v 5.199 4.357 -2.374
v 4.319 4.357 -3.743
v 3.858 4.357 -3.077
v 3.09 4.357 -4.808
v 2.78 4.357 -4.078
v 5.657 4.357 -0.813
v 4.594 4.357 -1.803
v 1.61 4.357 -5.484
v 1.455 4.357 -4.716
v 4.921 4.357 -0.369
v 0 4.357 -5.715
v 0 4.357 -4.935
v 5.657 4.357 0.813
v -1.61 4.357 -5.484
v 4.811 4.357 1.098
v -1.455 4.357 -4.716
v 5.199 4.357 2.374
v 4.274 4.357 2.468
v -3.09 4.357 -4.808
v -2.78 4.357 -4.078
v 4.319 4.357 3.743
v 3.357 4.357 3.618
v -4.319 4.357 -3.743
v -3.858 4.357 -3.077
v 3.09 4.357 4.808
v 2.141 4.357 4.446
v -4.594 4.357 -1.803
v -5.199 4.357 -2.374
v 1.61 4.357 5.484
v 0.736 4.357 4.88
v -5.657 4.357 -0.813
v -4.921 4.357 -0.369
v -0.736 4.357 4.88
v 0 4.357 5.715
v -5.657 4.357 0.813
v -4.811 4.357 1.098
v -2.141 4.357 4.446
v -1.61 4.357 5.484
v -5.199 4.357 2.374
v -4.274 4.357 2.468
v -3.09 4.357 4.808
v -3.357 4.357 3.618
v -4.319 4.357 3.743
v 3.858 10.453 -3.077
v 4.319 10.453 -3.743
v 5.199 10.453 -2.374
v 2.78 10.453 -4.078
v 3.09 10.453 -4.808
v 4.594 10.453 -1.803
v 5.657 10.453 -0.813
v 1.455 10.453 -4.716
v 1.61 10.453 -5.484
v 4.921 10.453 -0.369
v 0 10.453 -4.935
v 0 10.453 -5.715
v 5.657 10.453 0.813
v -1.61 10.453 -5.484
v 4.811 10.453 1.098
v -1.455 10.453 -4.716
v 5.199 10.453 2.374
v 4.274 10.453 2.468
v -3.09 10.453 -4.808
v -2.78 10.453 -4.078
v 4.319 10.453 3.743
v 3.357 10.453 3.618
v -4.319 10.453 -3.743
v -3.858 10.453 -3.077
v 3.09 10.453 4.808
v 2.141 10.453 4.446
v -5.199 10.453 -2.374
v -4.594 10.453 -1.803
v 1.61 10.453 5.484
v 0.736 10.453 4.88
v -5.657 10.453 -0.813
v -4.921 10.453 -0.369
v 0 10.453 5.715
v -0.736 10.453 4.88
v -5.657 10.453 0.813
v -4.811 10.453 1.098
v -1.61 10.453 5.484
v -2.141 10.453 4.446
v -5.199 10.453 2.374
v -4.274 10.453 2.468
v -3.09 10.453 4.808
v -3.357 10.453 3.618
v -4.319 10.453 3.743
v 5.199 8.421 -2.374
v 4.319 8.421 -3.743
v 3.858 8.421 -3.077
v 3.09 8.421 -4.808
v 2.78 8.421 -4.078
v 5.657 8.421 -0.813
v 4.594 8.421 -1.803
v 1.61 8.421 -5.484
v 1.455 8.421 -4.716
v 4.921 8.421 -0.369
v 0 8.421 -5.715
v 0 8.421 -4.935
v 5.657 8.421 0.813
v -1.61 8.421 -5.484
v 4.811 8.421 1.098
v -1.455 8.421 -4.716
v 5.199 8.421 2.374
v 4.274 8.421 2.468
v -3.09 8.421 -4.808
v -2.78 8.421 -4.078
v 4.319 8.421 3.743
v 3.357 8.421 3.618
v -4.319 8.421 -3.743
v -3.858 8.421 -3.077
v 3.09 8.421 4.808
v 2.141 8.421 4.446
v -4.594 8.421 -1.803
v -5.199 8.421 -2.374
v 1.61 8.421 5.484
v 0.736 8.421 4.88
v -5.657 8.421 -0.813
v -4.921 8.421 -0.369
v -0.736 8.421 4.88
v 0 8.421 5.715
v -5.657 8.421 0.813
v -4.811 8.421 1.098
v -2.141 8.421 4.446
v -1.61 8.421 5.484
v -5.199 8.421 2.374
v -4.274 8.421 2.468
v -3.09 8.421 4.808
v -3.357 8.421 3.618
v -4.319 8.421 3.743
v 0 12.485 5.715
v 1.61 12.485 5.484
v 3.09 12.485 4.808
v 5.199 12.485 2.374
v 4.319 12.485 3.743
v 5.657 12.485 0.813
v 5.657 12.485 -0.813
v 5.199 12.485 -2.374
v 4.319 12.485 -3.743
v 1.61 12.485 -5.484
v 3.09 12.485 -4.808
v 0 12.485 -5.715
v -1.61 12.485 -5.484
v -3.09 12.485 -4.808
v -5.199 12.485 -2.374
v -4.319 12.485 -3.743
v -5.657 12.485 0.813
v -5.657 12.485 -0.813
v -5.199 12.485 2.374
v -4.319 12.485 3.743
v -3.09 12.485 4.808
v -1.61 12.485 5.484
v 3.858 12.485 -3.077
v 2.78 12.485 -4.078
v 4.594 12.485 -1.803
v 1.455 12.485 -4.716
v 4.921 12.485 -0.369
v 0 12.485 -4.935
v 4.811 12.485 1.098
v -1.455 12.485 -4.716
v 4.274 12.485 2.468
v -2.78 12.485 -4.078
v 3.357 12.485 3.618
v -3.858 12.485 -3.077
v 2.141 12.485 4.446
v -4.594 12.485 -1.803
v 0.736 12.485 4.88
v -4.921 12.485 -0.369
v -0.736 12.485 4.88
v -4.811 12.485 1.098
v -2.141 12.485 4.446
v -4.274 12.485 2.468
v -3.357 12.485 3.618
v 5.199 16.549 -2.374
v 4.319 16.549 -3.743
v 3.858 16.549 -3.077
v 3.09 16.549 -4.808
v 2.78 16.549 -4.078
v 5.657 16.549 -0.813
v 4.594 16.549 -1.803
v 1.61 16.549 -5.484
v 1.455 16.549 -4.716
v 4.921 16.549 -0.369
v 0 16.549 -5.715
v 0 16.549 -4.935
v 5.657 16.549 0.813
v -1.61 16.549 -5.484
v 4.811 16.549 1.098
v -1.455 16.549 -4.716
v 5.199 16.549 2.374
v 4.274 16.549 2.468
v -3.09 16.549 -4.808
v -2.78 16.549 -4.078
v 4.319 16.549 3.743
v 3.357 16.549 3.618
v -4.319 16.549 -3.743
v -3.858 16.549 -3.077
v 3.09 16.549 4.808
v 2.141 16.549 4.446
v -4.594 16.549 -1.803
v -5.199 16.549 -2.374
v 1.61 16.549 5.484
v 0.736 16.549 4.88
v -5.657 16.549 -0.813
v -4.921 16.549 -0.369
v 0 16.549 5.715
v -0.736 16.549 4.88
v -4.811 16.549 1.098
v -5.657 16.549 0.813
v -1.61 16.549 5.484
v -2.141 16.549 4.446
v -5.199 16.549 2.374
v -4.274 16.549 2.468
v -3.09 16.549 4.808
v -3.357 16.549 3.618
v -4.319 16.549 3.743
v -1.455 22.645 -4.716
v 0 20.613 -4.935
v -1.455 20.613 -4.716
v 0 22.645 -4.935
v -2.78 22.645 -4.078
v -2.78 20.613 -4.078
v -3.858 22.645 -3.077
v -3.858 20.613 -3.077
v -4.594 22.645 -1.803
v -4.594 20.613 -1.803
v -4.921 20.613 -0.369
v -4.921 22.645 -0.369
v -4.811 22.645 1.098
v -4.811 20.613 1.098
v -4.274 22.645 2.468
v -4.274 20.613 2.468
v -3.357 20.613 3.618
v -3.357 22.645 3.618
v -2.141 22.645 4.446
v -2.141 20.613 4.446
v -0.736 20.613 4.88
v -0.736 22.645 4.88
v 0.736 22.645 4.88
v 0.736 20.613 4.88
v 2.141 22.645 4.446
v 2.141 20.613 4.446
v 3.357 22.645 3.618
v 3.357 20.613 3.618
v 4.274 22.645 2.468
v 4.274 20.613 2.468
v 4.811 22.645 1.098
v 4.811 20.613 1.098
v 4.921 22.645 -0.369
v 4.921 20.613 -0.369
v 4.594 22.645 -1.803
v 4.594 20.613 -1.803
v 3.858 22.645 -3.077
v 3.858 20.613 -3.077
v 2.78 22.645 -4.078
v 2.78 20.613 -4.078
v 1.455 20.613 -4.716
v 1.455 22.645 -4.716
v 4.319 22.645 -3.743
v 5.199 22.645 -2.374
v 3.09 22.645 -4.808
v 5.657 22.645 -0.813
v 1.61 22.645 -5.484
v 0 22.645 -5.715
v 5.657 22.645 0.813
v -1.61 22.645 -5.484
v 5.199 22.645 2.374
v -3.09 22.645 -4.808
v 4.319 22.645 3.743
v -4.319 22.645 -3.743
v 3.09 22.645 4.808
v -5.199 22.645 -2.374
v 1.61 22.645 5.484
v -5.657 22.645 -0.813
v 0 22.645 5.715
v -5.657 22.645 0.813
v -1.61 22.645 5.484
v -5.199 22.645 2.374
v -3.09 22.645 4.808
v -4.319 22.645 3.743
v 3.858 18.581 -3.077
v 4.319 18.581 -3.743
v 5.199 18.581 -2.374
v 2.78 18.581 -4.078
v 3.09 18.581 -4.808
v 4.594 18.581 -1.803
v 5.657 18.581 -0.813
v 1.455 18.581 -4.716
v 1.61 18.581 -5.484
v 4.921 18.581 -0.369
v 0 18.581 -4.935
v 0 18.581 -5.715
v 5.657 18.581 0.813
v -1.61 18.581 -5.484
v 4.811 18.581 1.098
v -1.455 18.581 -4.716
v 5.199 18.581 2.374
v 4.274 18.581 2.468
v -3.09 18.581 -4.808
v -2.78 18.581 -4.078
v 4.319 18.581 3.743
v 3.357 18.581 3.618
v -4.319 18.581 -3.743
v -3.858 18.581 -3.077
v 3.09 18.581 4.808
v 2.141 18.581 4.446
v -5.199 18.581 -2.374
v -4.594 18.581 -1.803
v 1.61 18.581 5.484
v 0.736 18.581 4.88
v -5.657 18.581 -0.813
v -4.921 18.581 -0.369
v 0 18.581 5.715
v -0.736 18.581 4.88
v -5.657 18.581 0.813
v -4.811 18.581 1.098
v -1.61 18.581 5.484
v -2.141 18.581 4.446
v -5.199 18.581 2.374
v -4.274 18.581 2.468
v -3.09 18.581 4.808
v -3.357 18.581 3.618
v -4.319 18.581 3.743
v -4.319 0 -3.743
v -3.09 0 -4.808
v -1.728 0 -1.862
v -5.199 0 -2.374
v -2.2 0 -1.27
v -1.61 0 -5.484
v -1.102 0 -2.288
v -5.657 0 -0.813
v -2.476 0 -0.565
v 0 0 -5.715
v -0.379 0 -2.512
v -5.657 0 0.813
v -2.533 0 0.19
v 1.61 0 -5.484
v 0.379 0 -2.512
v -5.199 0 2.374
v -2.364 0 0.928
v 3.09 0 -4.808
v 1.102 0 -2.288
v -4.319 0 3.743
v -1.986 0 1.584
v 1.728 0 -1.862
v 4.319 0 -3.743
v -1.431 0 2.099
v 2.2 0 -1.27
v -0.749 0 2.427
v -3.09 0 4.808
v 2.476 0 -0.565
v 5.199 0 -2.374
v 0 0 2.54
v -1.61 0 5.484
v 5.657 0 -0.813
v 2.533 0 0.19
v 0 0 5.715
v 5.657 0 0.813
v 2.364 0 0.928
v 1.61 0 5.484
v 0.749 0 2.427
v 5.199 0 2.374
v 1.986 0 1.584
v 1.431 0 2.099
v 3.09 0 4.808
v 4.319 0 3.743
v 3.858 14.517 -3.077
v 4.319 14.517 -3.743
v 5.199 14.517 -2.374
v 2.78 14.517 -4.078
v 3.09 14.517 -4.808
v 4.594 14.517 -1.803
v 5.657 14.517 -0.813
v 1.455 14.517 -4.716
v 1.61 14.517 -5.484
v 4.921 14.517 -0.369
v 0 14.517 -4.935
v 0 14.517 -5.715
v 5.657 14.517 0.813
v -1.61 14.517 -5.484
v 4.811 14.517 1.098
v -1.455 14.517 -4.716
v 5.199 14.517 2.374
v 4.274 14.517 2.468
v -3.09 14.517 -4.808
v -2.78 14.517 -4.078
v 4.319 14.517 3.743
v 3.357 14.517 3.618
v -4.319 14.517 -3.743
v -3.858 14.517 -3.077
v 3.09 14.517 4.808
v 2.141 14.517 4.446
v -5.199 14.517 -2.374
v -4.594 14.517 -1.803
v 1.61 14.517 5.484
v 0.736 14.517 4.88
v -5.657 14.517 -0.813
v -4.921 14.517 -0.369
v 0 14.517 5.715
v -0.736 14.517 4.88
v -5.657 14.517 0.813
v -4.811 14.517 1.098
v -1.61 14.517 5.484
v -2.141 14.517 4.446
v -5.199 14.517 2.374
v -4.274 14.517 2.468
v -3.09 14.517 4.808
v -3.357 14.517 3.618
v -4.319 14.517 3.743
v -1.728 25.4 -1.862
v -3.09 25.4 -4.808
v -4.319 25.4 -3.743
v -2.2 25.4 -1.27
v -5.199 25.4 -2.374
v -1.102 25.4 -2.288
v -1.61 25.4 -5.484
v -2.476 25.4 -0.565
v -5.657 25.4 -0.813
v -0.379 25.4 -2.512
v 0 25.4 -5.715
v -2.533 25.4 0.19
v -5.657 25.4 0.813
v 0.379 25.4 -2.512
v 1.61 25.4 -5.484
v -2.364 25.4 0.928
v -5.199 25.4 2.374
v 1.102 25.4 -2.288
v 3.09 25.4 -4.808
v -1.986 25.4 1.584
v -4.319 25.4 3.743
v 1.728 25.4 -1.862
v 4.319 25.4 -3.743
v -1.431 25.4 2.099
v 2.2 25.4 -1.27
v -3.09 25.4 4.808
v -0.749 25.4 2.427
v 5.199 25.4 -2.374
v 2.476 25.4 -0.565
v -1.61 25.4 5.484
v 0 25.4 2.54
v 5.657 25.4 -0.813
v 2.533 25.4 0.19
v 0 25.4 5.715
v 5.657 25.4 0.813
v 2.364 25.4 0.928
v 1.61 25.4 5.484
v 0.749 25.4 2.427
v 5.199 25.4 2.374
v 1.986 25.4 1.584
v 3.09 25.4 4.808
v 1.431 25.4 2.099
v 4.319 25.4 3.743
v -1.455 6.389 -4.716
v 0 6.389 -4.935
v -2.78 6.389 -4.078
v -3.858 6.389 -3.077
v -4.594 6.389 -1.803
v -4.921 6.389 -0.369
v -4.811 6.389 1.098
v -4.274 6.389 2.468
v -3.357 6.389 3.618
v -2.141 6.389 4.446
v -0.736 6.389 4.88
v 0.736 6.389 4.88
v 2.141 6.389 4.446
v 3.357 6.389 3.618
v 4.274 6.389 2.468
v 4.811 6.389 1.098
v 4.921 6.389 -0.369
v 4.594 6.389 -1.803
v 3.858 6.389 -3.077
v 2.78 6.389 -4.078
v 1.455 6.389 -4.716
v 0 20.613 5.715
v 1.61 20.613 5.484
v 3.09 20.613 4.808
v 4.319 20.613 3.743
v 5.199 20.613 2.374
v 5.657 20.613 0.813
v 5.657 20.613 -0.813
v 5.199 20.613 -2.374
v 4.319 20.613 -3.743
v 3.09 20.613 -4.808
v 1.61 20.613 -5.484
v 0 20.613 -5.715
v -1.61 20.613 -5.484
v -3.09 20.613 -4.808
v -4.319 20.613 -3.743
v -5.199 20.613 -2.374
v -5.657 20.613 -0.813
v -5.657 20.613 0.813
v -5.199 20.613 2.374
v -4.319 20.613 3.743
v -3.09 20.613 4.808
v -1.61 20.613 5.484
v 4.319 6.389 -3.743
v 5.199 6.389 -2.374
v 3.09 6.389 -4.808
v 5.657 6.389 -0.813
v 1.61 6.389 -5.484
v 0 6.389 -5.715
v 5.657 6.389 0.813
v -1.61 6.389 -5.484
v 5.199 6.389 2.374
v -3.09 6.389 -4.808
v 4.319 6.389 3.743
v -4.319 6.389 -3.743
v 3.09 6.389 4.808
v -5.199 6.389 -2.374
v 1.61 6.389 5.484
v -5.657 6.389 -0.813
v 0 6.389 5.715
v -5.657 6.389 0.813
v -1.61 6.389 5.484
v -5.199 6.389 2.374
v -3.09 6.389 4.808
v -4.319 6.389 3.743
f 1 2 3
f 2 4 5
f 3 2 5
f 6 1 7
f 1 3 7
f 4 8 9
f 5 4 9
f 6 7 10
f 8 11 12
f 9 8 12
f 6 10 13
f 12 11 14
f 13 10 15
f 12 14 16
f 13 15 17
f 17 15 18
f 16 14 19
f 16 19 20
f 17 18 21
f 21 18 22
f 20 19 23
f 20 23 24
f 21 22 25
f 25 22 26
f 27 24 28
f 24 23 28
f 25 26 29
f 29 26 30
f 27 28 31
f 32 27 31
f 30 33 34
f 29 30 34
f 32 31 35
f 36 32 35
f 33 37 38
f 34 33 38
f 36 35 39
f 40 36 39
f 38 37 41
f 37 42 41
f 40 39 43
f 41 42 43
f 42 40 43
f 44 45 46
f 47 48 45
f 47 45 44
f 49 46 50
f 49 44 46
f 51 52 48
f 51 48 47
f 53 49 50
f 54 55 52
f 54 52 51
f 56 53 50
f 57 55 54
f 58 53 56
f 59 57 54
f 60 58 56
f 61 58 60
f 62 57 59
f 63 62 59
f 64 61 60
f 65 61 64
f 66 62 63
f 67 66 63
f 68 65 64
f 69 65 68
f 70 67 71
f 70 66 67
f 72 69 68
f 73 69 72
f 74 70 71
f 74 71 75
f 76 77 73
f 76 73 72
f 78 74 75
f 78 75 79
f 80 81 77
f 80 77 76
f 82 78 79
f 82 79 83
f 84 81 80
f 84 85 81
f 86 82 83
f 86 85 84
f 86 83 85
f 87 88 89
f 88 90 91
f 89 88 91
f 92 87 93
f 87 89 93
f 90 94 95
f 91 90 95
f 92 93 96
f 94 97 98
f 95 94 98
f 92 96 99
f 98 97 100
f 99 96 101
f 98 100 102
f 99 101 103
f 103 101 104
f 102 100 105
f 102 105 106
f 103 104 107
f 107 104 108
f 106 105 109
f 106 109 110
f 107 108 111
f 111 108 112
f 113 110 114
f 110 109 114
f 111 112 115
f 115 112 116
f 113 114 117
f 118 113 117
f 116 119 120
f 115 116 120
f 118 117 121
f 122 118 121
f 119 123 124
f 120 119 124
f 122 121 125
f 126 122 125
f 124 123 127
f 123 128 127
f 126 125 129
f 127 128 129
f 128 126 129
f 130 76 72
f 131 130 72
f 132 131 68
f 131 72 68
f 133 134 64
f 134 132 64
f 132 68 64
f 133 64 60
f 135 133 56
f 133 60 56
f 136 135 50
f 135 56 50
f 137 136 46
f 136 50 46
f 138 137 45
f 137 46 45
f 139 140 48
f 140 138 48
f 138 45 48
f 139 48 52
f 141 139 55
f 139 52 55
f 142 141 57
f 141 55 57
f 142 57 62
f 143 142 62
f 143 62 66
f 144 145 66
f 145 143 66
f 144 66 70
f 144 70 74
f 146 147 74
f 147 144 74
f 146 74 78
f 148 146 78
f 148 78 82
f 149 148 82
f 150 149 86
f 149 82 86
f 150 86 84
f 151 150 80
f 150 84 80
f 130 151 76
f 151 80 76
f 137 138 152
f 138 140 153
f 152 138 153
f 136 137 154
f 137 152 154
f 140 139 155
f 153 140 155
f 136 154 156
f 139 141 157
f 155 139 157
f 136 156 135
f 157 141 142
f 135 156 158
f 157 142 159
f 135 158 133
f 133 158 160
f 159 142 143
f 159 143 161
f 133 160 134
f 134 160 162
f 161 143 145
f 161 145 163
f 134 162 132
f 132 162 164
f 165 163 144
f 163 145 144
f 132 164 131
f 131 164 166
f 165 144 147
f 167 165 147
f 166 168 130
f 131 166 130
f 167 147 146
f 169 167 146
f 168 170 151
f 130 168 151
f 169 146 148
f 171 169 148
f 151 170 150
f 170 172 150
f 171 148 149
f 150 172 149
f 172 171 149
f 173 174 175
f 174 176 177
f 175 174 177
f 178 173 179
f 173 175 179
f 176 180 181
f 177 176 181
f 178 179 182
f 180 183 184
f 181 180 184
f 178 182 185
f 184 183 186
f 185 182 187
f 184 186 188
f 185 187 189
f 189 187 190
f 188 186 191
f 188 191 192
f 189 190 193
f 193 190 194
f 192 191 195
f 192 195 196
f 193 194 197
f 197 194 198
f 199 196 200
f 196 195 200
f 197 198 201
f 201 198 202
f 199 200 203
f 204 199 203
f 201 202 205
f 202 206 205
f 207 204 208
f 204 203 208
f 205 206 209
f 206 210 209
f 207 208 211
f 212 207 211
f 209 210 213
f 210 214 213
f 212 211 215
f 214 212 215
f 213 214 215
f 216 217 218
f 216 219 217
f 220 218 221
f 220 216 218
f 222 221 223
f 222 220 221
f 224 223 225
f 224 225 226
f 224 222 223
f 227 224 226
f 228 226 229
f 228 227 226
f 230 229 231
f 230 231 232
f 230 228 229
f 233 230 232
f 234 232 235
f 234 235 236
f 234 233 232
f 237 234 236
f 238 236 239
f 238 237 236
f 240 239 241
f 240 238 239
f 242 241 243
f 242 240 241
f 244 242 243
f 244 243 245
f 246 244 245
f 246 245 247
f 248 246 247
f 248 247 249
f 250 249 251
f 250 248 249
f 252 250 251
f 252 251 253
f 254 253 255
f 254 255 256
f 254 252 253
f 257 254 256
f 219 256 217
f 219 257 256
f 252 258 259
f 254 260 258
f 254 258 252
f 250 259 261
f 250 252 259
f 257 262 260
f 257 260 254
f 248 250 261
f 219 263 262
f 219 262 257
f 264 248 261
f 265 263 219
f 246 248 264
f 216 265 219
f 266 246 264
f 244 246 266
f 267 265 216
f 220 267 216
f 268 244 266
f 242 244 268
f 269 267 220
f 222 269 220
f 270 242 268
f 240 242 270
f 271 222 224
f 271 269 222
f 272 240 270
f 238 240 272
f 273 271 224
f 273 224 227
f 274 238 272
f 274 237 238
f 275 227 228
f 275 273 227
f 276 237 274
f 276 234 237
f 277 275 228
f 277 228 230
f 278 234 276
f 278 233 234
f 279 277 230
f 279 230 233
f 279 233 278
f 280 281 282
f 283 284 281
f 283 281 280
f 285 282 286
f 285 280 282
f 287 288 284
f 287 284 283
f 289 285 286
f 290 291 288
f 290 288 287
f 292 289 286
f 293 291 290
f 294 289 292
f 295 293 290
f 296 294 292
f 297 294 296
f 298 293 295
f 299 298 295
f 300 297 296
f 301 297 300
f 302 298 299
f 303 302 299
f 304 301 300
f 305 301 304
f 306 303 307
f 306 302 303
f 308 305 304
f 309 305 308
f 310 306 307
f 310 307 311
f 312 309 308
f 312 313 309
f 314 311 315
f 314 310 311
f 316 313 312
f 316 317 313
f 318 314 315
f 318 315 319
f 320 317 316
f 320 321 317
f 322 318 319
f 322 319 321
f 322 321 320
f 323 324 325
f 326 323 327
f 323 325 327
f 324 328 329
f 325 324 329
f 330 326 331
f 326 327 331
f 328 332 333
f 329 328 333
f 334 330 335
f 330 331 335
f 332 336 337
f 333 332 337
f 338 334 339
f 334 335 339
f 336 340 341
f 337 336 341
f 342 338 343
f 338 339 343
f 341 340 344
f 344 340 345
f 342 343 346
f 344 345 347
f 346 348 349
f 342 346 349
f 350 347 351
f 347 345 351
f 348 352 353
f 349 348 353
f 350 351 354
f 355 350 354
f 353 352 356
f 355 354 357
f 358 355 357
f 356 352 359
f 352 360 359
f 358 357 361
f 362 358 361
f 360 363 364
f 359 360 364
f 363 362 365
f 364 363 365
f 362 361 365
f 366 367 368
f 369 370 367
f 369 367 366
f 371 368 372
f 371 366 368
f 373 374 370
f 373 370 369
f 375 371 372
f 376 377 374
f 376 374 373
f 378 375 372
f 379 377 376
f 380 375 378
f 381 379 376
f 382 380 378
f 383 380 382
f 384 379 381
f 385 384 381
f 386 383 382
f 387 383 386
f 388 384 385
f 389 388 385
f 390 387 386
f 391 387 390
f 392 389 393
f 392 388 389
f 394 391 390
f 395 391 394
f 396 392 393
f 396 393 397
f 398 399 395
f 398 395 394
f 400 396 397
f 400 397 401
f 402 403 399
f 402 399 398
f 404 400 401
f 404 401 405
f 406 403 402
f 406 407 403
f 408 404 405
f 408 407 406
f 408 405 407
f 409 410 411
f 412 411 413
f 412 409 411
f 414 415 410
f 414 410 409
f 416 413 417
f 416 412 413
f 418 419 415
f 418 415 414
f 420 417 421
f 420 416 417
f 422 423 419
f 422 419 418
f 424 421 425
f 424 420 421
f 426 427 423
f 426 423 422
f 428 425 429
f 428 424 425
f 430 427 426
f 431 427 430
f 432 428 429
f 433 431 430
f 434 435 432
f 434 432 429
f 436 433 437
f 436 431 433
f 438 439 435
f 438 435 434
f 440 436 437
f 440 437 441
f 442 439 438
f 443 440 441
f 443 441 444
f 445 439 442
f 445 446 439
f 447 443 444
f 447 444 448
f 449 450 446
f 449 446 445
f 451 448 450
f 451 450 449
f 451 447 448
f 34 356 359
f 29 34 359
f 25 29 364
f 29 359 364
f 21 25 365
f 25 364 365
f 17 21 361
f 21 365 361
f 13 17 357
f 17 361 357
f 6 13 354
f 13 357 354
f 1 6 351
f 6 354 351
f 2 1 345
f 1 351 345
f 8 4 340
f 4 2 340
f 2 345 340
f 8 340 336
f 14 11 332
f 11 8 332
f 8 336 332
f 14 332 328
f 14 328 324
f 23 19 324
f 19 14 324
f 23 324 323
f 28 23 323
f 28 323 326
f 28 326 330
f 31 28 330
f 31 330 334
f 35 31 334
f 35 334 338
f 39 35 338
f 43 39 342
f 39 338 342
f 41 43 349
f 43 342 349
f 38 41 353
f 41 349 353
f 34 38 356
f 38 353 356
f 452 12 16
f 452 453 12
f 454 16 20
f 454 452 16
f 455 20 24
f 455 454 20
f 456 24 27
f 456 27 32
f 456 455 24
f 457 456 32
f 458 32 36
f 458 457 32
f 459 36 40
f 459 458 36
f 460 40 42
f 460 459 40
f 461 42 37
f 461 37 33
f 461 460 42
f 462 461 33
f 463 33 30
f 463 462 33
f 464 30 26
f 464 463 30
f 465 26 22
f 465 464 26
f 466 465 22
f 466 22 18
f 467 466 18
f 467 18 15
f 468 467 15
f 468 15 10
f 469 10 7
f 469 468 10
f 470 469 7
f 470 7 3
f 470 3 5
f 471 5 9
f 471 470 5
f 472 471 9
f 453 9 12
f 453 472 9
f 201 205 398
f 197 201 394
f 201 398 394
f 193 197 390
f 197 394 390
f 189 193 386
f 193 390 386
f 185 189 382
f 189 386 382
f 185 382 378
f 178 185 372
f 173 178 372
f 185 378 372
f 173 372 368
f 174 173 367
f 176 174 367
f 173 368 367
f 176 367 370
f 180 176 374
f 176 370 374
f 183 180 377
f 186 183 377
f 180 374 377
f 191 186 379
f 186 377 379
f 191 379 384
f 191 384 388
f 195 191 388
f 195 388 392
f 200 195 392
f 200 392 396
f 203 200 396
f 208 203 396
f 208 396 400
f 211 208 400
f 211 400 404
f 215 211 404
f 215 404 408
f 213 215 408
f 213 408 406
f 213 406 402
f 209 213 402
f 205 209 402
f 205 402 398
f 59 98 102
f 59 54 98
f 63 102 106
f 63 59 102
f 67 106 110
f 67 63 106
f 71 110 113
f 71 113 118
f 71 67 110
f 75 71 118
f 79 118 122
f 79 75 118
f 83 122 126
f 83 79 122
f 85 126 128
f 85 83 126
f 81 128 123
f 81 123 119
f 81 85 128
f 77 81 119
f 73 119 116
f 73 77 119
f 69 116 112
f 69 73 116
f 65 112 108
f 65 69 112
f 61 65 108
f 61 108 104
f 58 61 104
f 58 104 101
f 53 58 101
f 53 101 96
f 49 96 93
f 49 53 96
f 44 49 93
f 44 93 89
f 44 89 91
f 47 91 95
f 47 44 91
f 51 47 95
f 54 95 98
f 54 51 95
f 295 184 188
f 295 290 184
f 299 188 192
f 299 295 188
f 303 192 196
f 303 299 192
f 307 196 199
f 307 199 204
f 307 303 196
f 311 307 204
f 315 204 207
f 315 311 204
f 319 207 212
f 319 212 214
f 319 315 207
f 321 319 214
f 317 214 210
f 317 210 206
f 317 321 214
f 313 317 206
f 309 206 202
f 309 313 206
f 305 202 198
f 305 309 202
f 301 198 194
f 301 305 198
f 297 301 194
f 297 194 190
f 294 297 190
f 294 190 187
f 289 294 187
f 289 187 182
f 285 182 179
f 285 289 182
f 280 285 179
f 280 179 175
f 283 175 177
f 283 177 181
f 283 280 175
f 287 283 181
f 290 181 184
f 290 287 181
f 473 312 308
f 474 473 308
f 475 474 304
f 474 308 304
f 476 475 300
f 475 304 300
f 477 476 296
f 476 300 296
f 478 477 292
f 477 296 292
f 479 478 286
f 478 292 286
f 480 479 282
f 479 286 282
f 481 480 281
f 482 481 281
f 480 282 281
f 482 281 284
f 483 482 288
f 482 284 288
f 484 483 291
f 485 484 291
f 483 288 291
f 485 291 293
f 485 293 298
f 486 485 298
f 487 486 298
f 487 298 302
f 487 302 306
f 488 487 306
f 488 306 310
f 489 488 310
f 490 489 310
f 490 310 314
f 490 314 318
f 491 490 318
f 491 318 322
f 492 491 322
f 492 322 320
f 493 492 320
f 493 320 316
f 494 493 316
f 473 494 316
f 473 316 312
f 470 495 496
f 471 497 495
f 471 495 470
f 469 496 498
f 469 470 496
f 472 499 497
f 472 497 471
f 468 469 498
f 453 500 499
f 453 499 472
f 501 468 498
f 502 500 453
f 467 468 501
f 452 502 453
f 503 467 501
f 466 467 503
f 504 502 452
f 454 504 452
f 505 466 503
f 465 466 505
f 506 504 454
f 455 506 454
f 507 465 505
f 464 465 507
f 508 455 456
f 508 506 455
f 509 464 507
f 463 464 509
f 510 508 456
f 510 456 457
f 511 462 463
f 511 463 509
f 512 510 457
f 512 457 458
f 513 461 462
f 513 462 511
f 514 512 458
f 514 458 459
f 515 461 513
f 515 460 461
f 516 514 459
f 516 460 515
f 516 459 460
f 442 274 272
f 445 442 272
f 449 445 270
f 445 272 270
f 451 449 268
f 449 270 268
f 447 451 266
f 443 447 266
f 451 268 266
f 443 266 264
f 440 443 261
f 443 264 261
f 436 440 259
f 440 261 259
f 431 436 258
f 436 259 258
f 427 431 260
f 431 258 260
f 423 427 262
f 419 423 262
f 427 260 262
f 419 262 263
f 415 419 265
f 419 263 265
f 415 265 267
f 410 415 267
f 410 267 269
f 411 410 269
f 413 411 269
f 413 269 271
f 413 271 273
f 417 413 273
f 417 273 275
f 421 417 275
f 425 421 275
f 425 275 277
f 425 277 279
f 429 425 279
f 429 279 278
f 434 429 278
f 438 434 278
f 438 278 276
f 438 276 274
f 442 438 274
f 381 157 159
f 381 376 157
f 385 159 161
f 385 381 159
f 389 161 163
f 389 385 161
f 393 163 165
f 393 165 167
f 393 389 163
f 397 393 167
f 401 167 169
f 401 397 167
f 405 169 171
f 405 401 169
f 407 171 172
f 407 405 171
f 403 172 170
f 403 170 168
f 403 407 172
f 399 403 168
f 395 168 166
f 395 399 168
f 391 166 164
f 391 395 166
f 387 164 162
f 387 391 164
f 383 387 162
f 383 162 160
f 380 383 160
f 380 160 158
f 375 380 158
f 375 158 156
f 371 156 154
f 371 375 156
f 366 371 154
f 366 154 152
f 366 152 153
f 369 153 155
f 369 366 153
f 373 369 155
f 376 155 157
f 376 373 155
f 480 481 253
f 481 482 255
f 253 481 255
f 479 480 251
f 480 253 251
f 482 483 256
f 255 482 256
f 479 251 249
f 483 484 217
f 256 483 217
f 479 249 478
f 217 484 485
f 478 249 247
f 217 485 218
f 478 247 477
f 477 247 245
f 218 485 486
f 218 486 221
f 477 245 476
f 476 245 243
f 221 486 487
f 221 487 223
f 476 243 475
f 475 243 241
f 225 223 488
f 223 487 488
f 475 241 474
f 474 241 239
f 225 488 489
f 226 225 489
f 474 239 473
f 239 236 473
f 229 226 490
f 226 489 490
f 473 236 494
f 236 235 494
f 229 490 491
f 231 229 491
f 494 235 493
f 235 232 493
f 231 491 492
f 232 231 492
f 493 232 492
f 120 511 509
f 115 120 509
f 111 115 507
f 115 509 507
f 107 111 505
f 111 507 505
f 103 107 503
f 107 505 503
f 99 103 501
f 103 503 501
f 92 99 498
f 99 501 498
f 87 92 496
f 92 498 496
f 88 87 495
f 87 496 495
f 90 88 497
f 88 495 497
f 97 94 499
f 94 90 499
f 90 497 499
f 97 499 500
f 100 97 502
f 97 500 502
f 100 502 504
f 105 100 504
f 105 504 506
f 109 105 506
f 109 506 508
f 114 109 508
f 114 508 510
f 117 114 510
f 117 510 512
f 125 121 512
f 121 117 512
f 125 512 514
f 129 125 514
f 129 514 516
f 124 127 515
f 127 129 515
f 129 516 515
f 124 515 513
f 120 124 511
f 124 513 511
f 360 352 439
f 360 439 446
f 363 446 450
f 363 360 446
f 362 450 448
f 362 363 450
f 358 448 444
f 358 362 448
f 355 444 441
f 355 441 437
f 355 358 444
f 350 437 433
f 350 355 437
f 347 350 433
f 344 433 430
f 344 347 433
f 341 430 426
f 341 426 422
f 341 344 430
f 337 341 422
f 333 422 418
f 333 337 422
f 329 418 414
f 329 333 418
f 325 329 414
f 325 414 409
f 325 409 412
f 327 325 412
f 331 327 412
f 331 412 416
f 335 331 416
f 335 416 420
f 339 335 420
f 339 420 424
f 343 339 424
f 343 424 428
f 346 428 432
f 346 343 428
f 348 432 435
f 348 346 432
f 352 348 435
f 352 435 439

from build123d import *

# Parameters (mm, degrees)
SKETCH1_R           = 5.715
SKETCH1_R_2         = 2.54
BOSS_EXTRUDE1_DEPTH = 25.4
SKETCH3_W           = 0.779816736
SKETCH3_H           = 2.032


with BuildPart() as part:
    # Sketch1 → Boss-Extrude1 (new body)
    with BuildSketch(Plane(origin=(0, 0, 0), x_dir=(1, 0, 0), z_dir=(0, 1, 0))):
        with Locations(Location((0, 0, 0), (0, 0, 270))):
            Circle(SKETCH1_R)
        with Locations(Location((0, 0, 0), (0, 0, 270))):
            Circle(SKETCH1_R_2, mode=Mode.SUBTRACT)
    extrude(amount=BOSS_EXTRUDE1_DEPTH)

    # Sketch3 → Cut-Revolve2 (revolve, cut)
    with BuildSketch(Plane(origin=(0, 0, 0), x_dir=(0, 0, -1), z_dir=(1, 0, 0))):
        with Locations((5.325091632, 5.373385887)):
            Rectangle(SKETCH3_W, SKETCH3_H)
        with Locations((5.325091632, 9.437385887)):
            Rectangle(SKETCH3_W, SKETCH3_H)
        with Locations((5.325091632, 13.501385887)):
            Rectangle(SKETCH3_W, SKETCH3_H)
        with Locations((5.325091632, 17.565385887)):
            Rectangle(SKETCH3_W, SKETCH3_H)
        with Locations((5.325091632, 21.629385887)):
            Rectangle(SKETCH3_W, SKETCH3_H)
    revolve(axis=Axis((0, 0, 0), (0, 1, 0)), mode=Mode.SUBTRACT)


solid = part.part
